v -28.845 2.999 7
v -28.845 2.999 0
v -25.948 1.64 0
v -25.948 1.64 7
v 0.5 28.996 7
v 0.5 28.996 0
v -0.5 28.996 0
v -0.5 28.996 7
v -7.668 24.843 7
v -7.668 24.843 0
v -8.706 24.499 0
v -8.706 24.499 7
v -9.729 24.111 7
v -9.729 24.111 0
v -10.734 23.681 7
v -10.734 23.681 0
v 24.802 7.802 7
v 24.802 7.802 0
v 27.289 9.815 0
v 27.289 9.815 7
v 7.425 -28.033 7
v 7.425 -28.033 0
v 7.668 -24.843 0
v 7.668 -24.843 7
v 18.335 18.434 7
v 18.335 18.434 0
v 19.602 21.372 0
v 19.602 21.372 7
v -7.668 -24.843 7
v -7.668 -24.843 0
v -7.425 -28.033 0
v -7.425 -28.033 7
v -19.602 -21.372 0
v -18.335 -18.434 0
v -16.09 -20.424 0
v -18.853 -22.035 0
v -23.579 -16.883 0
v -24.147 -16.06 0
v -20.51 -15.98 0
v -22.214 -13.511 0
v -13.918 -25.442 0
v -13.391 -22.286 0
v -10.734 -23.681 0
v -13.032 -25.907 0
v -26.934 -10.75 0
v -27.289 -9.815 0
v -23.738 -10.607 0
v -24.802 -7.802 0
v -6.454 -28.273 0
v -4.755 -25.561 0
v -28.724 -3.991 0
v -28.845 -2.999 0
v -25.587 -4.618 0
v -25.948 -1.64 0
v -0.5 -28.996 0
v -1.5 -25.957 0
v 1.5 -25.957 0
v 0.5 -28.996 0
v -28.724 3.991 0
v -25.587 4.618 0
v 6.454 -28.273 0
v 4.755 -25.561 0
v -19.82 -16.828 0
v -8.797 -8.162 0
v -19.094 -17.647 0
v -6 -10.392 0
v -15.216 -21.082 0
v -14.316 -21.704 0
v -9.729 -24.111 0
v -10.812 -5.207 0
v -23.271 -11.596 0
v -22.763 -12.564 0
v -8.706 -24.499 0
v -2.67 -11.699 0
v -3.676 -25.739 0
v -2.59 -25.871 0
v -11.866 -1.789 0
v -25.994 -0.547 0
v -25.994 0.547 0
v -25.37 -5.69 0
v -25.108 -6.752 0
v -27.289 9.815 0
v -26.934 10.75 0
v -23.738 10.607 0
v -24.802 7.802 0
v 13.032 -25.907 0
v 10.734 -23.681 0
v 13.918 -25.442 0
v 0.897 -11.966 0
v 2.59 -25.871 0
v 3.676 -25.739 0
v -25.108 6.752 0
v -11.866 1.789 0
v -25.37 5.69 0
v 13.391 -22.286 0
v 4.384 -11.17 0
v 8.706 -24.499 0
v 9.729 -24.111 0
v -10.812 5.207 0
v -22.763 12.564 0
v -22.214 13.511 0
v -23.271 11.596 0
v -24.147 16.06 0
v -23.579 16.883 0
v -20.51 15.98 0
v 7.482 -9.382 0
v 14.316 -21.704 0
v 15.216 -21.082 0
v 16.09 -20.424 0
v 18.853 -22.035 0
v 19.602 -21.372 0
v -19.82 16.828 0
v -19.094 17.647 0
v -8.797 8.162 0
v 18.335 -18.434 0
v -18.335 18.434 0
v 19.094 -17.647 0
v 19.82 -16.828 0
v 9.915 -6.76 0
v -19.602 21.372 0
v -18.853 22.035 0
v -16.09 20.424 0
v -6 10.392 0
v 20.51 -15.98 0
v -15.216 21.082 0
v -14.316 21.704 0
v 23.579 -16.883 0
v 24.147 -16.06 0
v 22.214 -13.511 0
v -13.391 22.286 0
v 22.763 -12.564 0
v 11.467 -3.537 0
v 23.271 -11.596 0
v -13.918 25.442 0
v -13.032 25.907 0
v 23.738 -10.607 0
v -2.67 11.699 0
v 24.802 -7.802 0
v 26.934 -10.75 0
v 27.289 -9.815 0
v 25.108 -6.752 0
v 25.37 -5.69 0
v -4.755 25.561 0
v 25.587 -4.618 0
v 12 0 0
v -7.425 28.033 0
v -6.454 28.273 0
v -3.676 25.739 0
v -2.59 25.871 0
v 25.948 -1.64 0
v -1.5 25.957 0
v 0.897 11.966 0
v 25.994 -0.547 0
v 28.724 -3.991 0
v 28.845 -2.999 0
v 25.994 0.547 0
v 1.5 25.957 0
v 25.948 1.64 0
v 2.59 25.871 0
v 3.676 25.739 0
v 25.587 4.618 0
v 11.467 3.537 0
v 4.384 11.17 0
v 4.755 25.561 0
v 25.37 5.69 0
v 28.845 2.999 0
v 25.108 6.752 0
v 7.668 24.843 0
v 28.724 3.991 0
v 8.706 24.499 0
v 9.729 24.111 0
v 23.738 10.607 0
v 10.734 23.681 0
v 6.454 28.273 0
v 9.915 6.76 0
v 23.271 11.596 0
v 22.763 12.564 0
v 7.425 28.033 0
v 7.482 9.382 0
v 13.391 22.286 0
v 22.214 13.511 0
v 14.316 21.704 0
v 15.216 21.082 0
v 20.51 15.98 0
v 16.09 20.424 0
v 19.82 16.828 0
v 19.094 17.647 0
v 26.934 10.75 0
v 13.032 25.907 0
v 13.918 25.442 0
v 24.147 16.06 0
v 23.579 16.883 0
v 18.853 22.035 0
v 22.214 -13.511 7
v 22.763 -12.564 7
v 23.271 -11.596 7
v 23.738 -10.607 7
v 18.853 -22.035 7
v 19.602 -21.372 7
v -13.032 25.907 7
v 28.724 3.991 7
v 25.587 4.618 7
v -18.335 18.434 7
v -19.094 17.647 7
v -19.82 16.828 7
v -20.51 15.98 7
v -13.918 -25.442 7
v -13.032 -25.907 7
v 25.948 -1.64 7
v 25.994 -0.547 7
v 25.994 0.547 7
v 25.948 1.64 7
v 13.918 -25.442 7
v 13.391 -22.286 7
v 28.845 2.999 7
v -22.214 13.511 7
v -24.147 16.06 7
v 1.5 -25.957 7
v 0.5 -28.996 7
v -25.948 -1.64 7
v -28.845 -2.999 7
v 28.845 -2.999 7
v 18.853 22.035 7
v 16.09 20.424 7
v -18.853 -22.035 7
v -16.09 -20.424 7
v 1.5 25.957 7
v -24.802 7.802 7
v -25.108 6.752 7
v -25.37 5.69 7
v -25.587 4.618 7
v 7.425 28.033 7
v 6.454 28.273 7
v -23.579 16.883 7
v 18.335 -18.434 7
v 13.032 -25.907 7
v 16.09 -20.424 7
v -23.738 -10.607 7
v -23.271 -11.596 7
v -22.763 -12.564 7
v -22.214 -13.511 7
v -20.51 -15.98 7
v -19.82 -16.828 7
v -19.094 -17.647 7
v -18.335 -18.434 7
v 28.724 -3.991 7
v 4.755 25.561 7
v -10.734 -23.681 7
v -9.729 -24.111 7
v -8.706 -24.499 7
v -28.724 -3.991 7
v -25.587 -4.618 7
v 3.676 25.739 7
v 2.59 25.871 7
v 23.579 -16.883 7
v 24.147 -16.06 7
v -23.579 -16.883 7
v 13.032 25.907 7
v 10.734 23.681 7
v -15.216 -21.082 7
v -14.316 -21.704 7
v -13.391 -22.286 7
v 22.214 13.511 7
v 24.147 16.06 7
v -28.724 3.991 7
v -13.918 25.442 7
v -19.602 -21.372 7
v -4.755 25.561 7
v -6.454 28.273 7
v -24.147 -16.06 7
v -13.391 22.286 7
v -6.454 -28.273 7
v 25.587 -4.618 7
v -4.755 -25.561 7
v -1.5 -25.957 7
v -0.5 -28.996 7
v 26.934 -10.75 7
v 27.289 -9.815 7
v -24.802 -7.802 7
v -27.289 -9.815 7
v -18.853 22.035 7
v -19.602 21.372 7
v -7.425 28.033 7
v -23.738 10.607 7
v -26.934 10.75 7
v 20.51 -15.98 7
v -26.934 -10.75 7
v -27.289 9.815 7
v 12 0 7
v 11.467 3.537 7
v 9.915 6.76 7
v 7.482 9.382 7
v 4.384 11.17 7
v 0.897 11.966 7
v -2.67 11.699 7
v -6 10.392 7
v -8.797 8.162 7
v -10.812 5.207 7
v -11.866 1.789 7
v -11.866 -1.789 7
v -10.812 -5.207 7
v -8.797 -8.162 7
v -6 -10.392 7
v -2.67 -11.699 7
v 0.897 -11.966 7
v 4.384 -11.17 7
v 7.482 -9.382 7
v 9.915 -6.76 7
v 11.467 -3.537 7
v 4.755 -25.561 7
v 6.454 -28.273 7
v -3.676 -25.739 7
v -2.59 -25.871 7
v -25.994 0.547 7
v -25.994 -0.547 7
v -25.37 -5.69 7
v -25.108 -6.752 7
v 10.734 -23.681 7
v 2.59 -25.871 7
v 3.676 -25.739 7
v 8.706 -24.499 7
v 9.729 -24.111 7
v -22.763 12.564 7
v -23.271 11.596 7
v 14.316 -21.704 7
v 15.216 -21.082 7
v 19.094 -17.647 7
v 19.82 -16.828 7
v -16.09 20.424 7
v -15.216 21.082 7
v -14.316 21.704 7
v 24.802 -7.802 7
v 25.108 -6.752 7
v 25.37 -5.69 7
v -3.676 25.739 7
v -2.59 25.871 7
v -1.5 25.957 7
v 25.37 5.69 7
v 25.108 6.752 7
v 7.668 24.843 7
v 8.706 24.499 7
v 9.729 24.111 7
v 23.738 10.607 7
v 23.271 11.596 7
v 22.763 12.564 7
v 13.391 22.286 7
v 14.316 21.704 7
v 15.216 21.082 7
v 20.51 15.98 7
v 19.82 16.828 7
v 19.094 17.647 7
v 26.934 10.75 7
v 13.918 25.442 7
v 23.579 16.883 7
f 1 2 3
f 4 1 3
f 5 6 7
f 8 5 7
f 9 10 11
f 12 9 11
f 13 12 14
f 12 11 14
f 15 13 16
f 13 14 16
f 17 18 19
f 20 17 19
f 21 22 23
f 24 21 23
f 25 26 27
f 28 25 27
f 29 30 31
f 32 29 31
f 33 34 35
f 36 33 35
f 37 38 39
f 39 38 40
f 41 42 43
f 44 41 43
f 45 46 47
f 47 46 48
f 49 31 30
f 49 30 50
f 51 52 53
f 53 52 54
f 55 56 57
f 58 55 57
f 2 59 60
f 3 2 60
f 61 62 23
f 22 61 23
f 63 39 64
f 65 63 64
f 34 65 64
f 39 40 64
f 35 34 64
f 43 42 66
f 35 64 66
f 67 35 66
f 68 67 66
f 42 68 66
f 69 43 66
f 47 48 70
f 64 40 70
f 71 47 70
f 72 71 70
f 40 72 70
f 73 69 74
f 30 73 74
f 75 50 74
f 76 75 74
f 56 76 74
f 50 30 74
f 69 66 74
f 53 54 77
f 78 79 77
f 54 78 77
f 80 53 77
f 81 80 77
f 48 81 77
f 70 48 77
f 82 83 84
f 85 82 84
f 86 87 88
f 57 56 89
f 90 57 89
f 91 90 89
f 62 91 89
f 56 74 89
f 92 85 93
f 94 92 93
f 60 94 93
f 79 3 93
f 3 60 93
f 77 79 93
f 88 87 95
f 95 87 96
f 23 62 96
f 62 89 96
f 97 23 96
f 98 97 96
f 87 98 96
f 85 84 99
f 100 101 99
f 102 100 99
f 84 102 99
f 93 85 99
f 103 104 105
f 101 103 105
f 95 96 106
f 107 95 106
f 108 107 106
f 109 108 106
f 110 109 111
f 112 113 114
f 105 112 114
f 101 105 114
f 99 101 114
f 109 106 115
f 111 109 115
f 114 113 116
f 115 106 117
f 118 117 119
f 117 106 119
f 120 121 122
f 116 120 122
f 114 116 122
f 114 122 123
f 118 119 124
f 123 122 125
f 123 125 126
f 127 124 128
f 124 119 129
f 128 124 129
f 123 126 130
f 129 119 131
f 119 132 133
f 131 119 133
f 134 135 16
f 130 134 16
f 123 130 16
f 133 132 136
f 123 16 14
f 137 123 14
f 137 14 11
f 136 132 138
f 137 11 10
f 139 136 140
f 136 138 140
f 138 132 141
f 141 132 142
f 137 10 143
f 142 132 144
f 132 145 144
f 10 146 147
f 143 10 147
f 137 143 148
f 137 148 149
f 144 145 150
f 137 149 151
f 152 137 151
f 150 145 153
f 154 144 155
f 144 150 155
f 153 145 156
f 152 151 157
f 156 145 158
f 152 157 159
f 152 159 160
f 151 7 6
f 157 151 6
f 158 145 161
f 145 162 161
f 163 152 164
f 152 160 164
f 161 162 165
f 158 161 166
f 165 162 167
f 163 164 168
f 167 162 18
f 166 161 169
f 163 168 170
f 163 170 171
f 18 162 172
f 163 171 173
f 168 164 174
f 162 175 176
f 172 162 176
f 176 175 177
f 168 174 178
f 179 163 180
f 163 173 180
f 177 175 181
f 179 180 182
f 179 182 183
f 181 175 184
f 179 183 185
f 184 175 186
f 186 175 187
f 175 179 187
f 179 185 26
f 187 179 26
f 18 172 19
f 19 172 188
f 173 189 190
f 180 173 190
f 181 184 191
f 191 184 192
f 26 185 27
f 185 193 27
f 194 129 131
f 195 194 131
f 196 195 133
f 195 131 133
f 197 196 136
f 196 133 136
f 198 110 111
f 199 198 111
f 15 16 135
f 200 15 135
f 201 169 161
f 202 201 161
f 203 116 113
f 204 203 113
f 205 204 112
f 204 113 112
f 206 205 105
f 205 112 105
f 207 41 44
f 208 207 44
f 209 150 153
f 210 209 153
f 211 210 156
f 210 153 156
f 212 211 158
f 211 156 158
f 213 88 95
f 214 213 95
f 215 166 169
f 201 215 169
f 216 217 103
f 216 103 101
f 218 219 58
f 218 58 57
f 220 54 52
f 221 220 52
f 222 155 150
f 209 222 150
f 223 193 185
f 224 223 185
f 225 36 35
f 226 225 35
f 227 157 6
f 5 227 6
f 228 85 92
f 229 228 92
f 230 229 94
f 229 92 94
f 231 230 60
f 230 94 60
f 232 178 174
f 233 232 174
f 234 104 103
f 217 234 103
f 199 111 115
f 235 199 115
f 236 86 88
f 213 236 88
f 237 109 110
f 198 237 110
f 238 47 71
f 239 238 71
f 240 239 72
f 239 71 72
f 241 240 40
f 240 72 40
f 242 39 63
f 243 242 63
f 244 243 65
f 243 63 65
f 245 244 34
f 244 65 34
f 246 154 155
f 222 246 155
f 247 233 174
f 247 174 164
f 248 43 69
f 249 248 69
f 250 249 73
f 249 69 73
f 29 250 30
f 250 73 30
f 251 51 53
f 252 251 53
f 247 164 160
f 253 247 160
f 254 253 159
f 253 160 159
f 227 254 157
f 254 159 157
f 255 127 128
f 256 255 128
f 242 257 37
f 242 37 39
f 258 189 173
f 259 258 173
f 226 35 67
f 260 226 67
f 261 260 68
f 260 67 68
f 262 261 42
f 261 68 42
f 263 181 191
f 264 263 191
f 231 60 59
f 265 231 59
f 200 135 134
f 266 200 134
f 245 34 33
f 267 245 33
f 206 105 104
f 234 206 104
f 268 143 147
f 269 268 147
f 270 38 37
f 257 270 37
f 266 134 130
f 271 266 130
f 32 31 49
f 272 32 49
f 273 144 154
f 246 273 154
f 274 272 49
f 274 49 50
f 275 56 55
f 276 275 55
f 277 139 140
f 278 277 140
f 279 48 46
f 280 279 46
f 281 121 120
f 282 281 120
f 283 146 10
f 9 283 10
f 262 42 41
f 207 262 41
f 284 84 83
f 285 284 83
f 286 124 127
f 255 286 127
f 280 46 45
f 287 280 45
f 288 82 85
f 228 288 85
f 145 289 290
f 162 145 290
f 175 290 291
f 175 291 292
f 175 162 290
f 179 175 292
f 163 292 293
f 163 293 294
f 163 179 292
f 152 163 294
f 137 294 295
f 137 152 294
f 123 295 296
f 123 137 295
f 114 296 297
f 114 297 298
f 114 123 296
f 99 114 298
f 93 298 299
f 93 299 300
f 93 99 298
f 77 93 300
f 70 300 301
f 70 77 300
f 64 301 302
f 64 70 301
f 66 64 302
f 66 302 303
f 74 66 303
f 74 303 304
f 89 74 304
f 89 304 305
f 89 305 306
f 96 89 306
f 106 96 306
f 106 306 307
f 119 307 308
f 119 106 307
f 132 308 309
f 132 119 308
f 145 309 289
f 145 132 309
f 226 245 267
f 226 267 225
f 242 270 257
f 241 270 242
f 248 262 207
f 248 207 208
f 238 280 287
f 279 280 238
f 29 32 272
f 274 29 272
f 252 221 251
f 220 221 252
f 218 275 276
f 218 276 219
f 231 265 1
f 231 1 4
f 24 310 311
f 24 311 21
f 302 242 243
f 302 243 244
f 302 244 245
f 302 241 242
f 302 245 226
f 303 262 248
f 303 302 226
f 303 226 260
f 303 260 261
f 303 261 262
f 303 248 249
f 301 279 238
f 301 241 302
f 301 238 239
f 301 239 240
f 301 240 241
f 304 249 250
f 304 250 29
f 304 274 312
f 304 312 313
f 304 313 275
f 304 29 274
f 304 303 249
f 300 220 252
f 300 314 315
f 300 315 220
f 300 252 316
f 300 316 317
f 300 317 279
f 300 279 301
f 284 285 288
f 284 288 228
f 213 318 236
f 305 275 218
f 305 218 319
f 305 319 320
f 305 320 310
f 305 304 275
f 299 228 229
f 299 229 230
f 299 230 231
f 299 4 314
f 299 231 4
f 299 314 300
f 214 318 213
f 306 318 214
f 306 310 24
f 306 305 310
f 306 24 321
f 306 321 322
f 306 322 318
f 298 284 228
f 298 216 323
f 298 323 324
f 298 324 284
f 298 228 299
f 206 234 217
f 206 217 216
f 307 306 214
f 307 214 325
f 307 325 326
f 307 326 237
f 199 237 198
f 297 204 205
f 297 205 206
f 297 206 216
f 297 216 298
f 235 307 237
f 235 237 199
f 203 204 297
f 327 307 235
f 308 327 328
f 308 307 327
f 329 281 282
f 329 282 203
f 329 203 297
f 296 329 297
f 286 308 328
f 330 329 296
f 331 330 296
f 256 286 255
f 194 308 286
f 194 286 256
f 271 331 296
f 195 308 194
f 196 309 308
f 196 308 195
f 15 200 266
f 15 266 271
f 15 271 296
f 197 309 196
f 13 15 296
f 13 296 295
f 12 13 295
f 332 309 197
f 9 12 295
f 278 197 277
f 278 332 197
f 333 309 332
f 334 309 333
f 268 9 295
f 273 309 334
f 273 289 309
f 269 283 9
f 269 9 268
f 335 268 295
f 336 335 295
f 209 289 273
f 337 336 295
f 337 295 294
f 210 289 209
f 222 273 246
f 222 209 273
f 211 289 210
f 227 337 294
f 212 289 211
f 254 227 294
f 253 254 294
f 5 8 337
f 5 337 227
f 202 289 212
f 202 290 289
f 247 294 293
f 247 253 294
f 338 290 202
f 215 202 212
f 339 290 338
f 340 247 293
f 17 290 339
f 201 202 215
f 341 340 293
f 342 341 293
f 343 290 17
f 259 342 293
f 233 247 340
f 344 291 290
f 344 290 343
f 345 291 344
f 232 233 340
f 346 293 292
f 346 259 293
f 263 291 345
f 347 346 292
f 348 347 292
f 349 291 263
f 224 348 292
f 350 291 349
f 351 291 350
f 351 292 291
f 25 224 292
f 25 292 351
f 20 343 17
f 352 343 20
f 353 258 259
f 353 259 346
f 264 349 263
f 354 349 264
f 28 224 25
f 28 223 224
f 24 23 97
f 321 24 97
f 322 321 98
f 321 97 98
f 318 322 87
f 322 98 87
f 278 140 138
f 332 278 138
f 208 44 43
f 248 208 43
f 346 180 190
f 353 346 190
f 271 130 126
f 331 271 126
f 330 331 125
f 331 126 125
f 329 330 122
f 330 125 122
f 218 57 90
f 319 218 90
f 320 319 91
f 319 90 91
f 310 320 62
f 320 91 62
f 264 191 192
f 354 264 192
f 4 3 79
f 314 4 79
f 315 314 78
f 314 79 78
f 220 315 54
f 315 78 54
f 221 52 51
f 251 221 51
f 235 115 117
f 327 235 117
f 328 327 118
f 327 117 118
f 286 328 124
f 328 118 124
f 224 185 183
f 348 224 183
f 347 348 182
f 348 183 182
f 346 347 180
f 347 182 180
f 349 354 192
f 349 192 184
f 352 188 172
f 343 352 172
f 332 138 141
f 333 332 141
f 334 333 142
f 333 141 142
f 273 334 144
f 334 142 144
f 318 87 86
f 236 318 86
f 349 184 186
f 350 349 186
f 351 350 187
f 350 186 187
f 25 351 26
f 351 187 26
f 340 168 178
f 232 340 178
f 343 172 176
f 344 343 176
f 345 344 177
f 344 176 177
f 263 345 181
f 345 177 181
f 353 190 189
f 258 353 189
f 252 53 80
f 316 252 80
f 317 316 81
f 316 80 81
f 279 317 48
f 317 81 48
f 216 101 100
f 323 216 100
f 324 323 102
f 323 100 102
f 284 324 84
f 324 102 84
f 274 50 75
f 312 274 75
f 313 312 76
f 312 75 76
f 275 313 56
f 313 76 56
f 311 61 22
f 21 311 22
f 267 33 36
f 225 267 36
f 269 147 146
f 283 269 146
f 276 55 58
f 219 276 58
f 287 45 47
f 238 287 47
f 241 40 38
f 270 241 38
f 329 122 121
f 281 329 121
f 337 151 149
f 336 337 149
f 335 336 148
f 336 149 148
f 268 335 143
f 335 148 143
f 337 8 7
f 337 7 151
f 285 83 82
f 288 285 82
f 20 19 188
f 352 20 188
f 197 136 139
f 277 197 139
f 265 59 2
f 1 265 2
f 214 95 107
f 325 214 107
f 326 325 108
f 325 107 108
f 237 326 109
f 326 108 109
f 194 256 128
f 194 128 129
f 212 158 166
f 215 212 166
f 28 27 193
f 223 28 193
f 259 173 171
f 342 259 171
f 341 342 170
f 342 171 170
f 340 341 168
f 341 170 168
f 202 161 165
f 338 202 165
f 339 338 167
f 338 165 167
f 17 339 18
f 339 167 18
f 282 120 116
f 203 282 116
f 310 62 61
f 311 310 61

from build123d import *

# Parameters (mm, degrees)
SKETCH1_R           = 12
BOSS_EXTRUDE1_DEPTH = 7


with BuildPart() as part:
    # Sketch1 → Boss-Extrude1 (new body)
    with BuildSketch(Plane.XY):
        with BuildLine():
            Line((6.453651746, 28.272785132), (4.75543091, 25.561413828))
            ThreePointArc((4.75543091, 25.561413828), (3.133953687, 25.810430727), (1.5, 25.956694705))
            Line((1.5, 25.956694705), (0.5, 28.995689335))
            Line((0.5, 28.995689335), (-0.5, 28.995689335))
            Line((-0.5, 28.995689335), (-1.5, 25.956694705))
            ThreePointArc((-1.5, 25.956694705), (-3.133953687, 25.810430727), (-4.75543091, 25.561413828))
            Line((-4.75543091, 25.561413828), (-6.453651746, 28.272785132))
            Line((-6.453651746, 28.272785132), (-7.424593563, 28.033469468))
            Line((-7.424593563, 28.033469468), (-7.668256362, 24.843466835))
            ThreePointArc((-7.668256362, 24.843466835), (-9.219727063, 24.31042231), (-10.734493461, 23.680596491))
            Line((-10.734493461, 23.680596491), (-13.03224071, 25.906769425))
            Line((-13.03224071, 25.906769425), (-13.917696736, 25.442046253))
            Line((-13.917696736, 25.442046253), (-13.390861537, 22.286426974))
            ThreePointArc((-13.390861537, 22.286426974), (-14.769683415, 21.397580513), (-16.08970627, 20.423548961))
            Line((-16.08970627, 20.423548961), (-18.853443215, 22.035146447))
            Line((-18.853443215, 22.035146447), (-19.601953963, 21.372023789))
            Line((-19.601953963, 21.372023789), (-18.335238514, 18.434180986))
            ThreePointArc((-18.335238514, 18.434180986), (-19.461279452, 17.241189114), (-20.509843834, 15.979559002))
            Line((-20.509843834, 15.979559002), (-23.57895213, 16.882920851))
            Line((-23.57895213, 16.882920851), (-24.147016876, 16.059936985))
            Line((-24.147016876, 16.059936985), (-22.214038074, 13.510607405))
            ThreePointArc((-22.214038074, 13.510607405), (-23.021856667, 12.082802473), (-23.738023825, 10.606895158))
            Line((-23.738023825, 10.606895158), (-26.934138052, 10.749521263))
            Line((-26.934138052, 10.749521263), (-27.288742939, 9.81450502))
            Line((-27.288742939, 9.81450502), (-24.801838486, 7.80184643))
            ThreePointArc((-24.801838486, 7.80184643), (-25.244487253, 6.222207271), (-25.586636155, 4.617797121))
            Line((-25.586636155, 4.617797121), (-28.724009773, 3.991398571))
            Line((-28.724009773, 3.991398571), (-28.844546453, 2.998689697))
            Line((-28.844546453, 2.998689697), (-25.948246196, 1.639670499))
            ThreePointArc((-25.948246196, 1.639670499), (-26, 0), (-25.948246196, -1.639670499))
            Line((-25.948246196, -1.639670499), (-28.844546453, -2.998689697))
            Line((-28.844546453, -2.998689697), (-28.724009773, -3.991398571))
            Line((-28.724009773, -3.991398571), (-25.586636155, -4.617797121))
            ThreePointArc((-25.586636155, -4.617797121), (-25.244487253, -6.222207271), (-24.801838486, -7.80184643))
            Line((-24.801838486, -7.80184643), (-27.288742939, -9.81450502))
            Line((-27.288742939, -9.81450502), (-26.934138052, -10.749521263))
            Line((-26.934138052, -10.749521263), (-23.738023825, -10.606895158))
            ThreePointArc((-23.738023825, -10.606895158), (-23.021856667, -12.082802473), (-22.214038074, -13.510607405))
            Line((-22.214038074, -13.510607405), (-24.147016876, -16.059936985))
            Line((-24.147016876, -16.059936985), (-23.57895213, -16.882920851))
            Line((-23.57895213, -16.882920851), (-20.509843834, -15.979559002))
            ThreePointArc((-20.509843834, -15.979559002), (-19.461279452, -17.241189114), (-18.335238514, -18.434180986))
            Line((-18.335238514, -18.434180986), (-19.601953963, -21.372023789))
            Line((-19.601953963, -21.372023789), (-18.853443215, -22.035146447))
            Line((-18.853443215, -22.035146447), (-16.08970627, -20.423548961))
            ThreePointArc((-16.08970627, -20.423548961), (-14.769683415, -21.397580513), (-13.390861537, -22.286426974))
            Line((-13.390861537, -22.286426974), (-13.917696736, -25.442046253))
            Line((-13.917696736, -25.442046253), (-13.03224071, -25.906769425))
            Line((-13.03224071, -25.906769425), (-10.734493461, -23.680596491))
            ThreePointArc((-10.734493461, -23.680596491), (-9.219727063, -24.31042231), (-7.668256362, -24.843466835))
            Line((-7.668256362, -24.843466835), (-7.424593563, -28.033469468))
            Line((-7.424593563, -28.033469468), (-6.453651746, -28.272785132))
            Line((-6.453651746, -28.272785132), (-4.75543091, -25.561413828))
            ThreePointArc((-4.75543091, -25.561413828), (-3.133953687, -25.810430727), (-1.5, -25.956694705))
            Line((-1.5, -25.956694705), (-0.5, -28.995689335))
            Line((-0.5, -28.995689335), (0.5, -28.995689335))
            Line((0.5, -28.995689335), (1.5, -25.956694705))
            ThreePointArc((1.5, -25.956694705), (3.133953687, -25.810430727), (4.75543091, -25.561413828))
            Line((4.75543091, -25.561413828), (6.453651746, -28.272785132))
            Line((6.453651746, -28.272785132), (7.424593563, -28.033469468))
            Line((7.424593563, -28.033469468), (7.668256362, -24.843466835))
            ThreePointArc((7.668256362, -24.843466835), (9.219727063, -24.31042231), (10.734493461, -23.680596491))
            Line((10.734493461, -23.680596491), (13.03224071, -25.906769425))
            Line((13.03224071, -25.906769425), (13.917696736, -25.442046253))
            Line((13.917696736, -25.442046253), (13.390861537, -22.286426974))
            ThreePointArc((13.390861537, -22.286426974), (14.769683415, -21.397580513), (16.08970627, -20.423548961))
            Line((16.08970627, -20.423548961), (18.853443215, -22.035146447))
            Line((18.853443215, -22.035146447), (19.601953963, -21.372023789))
            Line((19.601953963, -21.372023789), (18.335238514, -18.434180986))
            ThreePointArc((18.335238514, -18.434180986), (19.461279452, -17.241189114), (20.509843834, -15.979559002))
            Line((20.509843834, -15.979559002), (23.57895213, -16.882920851))
            Line((23.57895213, -16.882920851), (24.147016876, -16.059936985))
            Line((24.147016876, -16.059936985), (22.214038074, -13.510607405))
            ThreePointArc((22.214038074, -13.510607405), (23.021856667, -12.082802473), (23.738023825, -10.606895158))
            Line((23.738023825, -10.606895158), (26.934138052, -10.749521263))
            Line((26.934138052, -10.749521263), (27.288742939, -9.81450502))
            Line((27.288742939, -9.81450502), (24.801838486, -7.80184643))
            ThreePointArc((24.801838486, -7.80184643), (25.244487253, -6.222207271), (25.586636155, -4.617797121))
            Line((25.586636155, -4.617797121), (28.724009773, -3.991398571))
            Line((28.724009773, -3.991398571), (28.844546453, -2.998689697))
            Line((28.844546453, -2.998689697), (25.948246196, -1.639670499))
            ThreePointArc((25.948246196, -1.639670499), (26, 0), (25.948246196, 1.639670499))
            Line((25.948246196, 1.639670499), (28.844546453, 2.998689697))
            Line((28.844546453, 2.998689697), (28.724009773, 3.991398571))
            Line((28.724009773, 3.991398571), (25.586636155, 4.617797121))
            ThreePointArc((25.586636155, 4.617797121), (25.244487253, 6.222207271), (24.801838486, 7.80184643))
            Line((24.801838486, 7.80184643), (27.288742939, 9.81450502))
            Line((27.288742939, 9.81450502), (26.934138052, 10.749521263))
            Line((26.934138052, 10.749521263), (23.738023825, 10.606895158))
            ThreePointArc((23.738023825, 10.606895158), (23.021856667, 12.082802473), (22.214038074, 13.510607405))
            Line((22.214038074, 13.510607405), (24.147016876, 16.059936985))
            Line((24.147016876, 16.059936985), (23.57895213, 16.882920851))
            Line((23.57895213, 16.882920851), (20.509843834, 15.979559002))
            ThreePointArc((20.509843834, 15.979559002), (19.461279452, 17.241189114), (18.335238514, 18.434180986))
            Line((18.335238514, 18.434180986), (19.601953963, 21.372023789))
            Line((19.601953963, 21.372023789), (18.853443215, 22.035146447))
            Line((18.853443215, 22.035146447), (16.08970627, 20.423548961))
            ThreePointArc((16.08970627, 20.423548961), (14.769683415, 21.397580513), (13.390861537, 22.286426974))
            Line((13.390861537, 22.286426974), (13.917696736, 25.442046253))
            Line((13.917696736, 25.442046253), (13.03224071, 25.906769425))
            Line((13.03224071, 25.906769425), (10.734493461, 23.680596491))
            ThreePointArc((10.734493461, 23.680596491), (9.219727063, 24.31042231), (7.668256362, 24.843466835))
            Line((7.668256362, 24.843466835), (7.424593563, 28.033469468))
            Line((7.424593563, 28.033469468), (6.453651746, 28.272785132))
        make_face()
        Circle(SKETCH1_R, mode=Mode.SUBTRACT)
    extrude(amount=BOSS_EXTRUDE1_DEPTH)


solid = part.part
